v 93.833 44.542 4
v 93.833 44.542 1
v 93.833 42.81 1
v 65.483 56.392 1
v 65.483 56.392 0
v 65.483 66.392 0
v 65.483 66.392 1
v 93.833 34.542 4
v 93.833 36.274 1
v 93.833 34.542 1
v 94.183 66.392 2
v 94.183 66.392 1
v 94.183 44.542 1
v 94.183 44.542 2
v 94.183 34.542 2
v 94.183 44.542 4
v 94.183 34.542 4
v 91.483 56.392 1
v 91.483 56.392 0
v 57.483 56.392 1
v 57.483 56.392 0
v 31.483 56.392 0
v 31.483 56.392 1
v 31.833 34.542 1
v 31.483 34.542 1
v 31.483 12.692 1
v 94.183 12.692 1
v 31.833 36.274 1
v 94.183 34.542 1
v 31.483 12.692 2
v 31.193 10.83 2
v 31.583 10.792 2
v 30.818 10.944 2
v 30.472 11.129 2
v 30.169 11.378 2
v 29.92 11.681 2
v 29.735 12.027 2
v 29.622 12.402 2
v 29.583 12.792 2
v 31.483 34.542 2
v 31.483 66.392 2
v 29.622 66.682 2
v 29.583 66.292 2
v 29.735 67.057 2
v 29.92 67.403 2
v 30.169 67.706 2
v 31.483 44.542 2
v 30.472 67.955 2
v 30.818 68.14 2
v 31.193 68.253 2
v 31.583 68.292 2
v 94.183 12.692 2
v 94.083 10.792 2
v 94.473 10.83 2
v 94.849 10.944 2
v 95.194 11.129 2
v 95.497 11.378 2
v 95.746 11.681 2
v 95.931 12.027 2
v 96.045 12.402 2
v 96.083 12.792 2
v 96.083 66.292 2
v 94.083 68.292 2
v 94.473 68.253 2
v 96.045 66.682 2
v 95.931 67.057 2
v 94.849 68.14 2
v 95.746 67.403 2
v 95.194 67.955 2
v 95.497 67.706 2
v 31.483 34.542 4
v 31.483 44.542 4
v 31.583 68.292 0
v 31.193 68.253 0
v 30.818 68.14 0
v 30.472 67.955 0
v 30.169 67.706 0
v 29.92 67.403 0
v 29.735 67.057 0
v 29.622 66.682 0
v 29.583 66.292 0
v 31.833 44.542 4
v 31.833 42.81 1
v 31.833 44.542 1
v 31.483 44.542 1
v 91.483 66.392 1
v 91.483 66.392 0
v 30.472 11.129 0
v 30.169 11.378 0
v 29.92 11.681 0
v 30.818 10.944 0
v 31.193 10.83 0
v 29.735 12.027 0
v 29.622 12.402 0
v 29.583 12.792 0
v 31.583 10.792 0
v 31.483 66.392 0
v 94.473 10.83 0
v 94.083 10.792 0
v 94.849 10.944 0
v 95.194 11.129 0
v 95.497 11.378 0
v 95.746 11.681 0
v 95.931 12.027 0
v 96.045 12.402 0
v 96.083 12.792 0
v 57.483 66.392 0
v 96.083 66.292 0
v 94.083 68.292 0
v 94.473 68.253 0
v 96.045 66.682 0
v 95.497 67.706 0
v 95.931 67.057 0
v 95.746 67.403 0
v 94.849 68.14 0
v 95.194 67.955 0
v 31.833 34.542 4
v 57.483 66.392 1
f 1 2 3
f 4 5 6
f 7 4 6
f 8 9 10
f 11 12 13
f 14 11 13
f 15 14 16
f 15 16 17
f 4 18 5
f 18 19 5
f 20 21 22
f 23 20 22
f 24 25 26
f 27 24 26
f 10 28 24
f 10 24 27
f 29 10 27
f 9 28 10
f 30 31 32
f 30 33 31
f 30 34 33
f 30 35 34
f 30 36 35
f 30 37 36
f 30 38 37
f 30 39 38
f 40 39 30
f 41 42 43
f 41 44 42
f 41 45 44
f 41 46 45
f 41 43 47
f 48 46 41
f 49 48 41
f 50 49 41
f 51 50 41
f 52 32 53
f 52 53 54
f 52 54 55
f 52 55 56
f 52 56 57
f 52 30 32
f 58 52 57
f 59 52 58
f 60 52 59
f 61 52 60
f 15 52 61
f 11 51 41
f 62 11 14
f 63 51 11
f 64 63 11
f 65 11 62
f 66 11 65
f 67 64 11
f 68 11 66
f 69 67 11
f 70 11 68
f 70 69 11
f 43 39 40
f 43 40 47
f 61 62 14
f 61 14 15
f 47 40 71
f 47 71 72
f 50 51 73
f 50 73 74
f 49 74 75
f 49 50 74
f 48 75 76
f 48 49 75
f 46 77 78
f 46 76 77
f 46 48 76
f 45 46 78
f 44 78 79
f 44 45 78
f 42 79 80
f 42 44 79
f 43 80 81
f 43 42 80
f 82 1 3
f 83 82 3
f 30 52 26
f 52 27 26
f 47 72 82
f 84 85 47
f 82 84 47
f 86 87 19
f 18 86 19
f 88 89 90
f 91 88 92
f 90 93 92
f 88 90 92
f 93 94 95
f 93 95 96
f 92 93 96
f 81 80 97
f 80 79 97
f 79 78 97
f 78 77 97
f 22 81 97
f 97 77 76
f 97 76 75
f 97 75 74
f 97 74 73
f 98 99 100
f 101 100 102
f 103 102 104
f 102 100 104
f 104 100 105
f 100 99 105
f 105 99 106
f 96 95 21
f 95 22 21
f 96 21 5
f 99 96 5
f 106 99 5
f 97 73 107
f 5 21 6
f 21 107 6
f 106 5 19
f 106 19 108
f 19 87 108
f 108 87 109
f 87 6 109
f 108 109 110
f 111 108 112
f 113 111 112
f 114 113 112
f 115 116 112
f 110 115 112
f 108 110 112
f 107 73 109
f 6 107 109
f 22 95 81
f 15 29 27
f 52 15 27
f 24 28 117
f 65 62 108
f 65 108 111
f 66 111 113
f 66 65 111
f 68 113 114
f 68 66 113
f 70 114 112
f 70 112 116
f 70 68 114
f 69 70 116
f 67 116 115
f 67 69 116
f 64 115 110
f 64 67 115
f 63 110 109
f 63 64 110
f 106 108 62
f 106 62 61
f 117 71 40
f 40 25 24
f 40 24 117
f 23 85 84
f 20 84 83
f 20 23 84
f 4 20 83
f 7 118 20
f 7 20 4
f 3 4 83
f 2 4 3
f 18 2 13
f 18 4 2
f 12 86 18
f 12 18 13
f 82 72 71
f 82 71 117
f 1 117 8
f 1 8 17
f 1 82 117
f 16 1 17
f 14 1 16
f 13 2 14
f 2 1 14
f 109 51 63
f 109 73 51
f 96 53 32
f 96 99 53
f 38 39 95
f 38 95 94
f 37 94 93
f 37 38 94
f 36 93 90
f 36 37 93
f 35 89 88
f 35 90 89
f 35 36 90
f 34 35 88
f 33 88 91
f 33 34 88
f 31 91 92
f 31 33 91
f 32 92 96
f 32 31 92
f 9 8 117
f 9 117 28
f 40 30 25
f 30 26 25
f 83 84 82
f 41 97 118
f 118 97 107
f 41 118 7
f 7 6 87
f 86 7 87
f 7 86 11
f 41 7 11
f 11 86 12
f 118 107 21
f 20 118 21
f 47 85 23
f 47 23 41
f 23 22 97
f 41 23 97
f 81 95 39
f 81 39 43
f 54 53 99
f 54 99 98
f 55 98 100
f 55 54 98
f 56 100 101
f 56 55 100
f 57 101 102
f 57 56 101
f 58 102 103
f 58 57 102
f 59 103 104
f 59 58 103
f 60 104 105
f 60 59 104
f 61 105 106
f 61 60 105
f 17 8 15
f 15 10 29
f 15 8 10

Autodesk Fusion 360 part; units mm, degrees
sketch "Schizzo1" plane through (0, 0, 0) normal (0, 0, 1) x (1, 0, 0)
  line L0 (29.4832, 68.3919) -> (96.1832, 68.3919) construction
  line L1 (96.1832, 68.3919) -> (96.1832, 10.6919) construction
  line L2 (96.1832, 10.6919) -> (29.4832, 10.6919) construction
  line L3 (29.4832, 10.6919) -> (29.4832, 68.3919) construction
  line L4 (96.0832, 10.7919) -> (29.5832, 10.7919)
  line L5 (29.5832, 10.7919) -> (29.5832, 68.2919)
  line L6 (29.5832, 68.2919) -> (96.0832, 68.2919)
  line L7 (96.0832, 68.2919) -> (96.0832, 10.7919)
  line L8 (94.1832, 12.6919) -> (31.4832, 12.6919)
  line L9 (31.4832, 12.6919) -> (31.4832, 66.3919)
  line L10 (31.4832, 66.3919) -> (94.1832, 66.3919)
  line L11 (94.1832, 66.3919) -> (94.1832, 12.6919)
  line L12 (31.4832, 66.3919) -> (57.4832, 66.3919)
  line L13 (57.4832, 66.3919) -> (57.4832, 56.3919)
  line L14 (57.4832, 56.3919) -> (31.4832, 56.3919)
  line L15 (31.4832, 56.3919) -> (31.4832, 66.3919)
  line L16 (65.4832, 66.3919) -> (91.4832, 66.3919)
  line L17 (91.4832, 56.3919) -> (65.4832, 56.3919)
  line L18 (91.4832, 66.3919) -> (91.4832, 56.3919)
  line L19 (65.4832, 56.3919) -> (65.4832, 66.3919)
  line L20 (29.4832, 39.5419) -> (96.1832, 39.5419) construction
  line L21 (31.4832, 44.5419) -> (94.1832, 44.5419)
  line L22 (31.4832, 34.5419) -> (94.1832, 34.5419)
  line L23 (62.8332, 68.3919) -> (62.8332, 10.7919) construction
  dimension "d1" = 66.7
  dimension "d2" = 57.7
  dimension "d3" = 0.1
  dimension "d4" = 2
  dimension "d5" = 26
  dimension "d6" = 10
  dimension "d9" = 34
  dimension "d10" = 0
  dimension "d16" = 10
extrude "Estrusione1" add sketch "Schizzo1" along normal blind 1 contours L8 L9 L11 L22 | L9 L11 L21 L22 | L9 L10 L11 L13 L14 L17 L18 L19 L21
extrude "Estrusione2" add sketch "Schizzo1" along normal blind 2
fillet "Raccordo1" radius 2 4 edges at (29.5832, 10.7919, 1) (96.0832, 10.7919, 1) (96.0832, 68.2919, 1) (29.5832, 68.2919, 1)
extrude "Estrusione3" add sketch "Schizzo1" along normal blind 4 contours L9 L11 L21 L22
ref_plane "Piano di lavoro1" through (62.8332, 39.5919, 0) normal (-1, 0, 0) x (0, -1, 0)
sketch "Schizzo2" plane through (62.8332, 0, 0) normal (-1, 0, 0) x (0, -1, 0)
  line L0 (-34.5419, 1) -> (-44.5419, 1) construction
  line L1 (-34.5419, 1) -> (-34.5419, 4)
  line L2 (-34.5419, 4) -> (-36.274, 1)
  line L3 (-36.274, 1) -> (-34.5419, 1)
  line L4 (-39.5419, 1) -> (-39.5419, 4) construction
  line L5 (-44.5419, 4) -> (-34.5419, 4) construction
  line L6 (-44.5419, 4) -> (-42.8099, 1)
  line L7 (-42.8099, 1) -> (-44.5419, 1)
  line L8 (-44.5419, 1) -> (-44.5419, 4)
  point P0 (-34.5419, 1)
  point P1 (-44.5419, 1)
  dimension "d20" = 30
extrude "Estrusione4" cut sketch "Schizzo2" along normal mid plane 62
